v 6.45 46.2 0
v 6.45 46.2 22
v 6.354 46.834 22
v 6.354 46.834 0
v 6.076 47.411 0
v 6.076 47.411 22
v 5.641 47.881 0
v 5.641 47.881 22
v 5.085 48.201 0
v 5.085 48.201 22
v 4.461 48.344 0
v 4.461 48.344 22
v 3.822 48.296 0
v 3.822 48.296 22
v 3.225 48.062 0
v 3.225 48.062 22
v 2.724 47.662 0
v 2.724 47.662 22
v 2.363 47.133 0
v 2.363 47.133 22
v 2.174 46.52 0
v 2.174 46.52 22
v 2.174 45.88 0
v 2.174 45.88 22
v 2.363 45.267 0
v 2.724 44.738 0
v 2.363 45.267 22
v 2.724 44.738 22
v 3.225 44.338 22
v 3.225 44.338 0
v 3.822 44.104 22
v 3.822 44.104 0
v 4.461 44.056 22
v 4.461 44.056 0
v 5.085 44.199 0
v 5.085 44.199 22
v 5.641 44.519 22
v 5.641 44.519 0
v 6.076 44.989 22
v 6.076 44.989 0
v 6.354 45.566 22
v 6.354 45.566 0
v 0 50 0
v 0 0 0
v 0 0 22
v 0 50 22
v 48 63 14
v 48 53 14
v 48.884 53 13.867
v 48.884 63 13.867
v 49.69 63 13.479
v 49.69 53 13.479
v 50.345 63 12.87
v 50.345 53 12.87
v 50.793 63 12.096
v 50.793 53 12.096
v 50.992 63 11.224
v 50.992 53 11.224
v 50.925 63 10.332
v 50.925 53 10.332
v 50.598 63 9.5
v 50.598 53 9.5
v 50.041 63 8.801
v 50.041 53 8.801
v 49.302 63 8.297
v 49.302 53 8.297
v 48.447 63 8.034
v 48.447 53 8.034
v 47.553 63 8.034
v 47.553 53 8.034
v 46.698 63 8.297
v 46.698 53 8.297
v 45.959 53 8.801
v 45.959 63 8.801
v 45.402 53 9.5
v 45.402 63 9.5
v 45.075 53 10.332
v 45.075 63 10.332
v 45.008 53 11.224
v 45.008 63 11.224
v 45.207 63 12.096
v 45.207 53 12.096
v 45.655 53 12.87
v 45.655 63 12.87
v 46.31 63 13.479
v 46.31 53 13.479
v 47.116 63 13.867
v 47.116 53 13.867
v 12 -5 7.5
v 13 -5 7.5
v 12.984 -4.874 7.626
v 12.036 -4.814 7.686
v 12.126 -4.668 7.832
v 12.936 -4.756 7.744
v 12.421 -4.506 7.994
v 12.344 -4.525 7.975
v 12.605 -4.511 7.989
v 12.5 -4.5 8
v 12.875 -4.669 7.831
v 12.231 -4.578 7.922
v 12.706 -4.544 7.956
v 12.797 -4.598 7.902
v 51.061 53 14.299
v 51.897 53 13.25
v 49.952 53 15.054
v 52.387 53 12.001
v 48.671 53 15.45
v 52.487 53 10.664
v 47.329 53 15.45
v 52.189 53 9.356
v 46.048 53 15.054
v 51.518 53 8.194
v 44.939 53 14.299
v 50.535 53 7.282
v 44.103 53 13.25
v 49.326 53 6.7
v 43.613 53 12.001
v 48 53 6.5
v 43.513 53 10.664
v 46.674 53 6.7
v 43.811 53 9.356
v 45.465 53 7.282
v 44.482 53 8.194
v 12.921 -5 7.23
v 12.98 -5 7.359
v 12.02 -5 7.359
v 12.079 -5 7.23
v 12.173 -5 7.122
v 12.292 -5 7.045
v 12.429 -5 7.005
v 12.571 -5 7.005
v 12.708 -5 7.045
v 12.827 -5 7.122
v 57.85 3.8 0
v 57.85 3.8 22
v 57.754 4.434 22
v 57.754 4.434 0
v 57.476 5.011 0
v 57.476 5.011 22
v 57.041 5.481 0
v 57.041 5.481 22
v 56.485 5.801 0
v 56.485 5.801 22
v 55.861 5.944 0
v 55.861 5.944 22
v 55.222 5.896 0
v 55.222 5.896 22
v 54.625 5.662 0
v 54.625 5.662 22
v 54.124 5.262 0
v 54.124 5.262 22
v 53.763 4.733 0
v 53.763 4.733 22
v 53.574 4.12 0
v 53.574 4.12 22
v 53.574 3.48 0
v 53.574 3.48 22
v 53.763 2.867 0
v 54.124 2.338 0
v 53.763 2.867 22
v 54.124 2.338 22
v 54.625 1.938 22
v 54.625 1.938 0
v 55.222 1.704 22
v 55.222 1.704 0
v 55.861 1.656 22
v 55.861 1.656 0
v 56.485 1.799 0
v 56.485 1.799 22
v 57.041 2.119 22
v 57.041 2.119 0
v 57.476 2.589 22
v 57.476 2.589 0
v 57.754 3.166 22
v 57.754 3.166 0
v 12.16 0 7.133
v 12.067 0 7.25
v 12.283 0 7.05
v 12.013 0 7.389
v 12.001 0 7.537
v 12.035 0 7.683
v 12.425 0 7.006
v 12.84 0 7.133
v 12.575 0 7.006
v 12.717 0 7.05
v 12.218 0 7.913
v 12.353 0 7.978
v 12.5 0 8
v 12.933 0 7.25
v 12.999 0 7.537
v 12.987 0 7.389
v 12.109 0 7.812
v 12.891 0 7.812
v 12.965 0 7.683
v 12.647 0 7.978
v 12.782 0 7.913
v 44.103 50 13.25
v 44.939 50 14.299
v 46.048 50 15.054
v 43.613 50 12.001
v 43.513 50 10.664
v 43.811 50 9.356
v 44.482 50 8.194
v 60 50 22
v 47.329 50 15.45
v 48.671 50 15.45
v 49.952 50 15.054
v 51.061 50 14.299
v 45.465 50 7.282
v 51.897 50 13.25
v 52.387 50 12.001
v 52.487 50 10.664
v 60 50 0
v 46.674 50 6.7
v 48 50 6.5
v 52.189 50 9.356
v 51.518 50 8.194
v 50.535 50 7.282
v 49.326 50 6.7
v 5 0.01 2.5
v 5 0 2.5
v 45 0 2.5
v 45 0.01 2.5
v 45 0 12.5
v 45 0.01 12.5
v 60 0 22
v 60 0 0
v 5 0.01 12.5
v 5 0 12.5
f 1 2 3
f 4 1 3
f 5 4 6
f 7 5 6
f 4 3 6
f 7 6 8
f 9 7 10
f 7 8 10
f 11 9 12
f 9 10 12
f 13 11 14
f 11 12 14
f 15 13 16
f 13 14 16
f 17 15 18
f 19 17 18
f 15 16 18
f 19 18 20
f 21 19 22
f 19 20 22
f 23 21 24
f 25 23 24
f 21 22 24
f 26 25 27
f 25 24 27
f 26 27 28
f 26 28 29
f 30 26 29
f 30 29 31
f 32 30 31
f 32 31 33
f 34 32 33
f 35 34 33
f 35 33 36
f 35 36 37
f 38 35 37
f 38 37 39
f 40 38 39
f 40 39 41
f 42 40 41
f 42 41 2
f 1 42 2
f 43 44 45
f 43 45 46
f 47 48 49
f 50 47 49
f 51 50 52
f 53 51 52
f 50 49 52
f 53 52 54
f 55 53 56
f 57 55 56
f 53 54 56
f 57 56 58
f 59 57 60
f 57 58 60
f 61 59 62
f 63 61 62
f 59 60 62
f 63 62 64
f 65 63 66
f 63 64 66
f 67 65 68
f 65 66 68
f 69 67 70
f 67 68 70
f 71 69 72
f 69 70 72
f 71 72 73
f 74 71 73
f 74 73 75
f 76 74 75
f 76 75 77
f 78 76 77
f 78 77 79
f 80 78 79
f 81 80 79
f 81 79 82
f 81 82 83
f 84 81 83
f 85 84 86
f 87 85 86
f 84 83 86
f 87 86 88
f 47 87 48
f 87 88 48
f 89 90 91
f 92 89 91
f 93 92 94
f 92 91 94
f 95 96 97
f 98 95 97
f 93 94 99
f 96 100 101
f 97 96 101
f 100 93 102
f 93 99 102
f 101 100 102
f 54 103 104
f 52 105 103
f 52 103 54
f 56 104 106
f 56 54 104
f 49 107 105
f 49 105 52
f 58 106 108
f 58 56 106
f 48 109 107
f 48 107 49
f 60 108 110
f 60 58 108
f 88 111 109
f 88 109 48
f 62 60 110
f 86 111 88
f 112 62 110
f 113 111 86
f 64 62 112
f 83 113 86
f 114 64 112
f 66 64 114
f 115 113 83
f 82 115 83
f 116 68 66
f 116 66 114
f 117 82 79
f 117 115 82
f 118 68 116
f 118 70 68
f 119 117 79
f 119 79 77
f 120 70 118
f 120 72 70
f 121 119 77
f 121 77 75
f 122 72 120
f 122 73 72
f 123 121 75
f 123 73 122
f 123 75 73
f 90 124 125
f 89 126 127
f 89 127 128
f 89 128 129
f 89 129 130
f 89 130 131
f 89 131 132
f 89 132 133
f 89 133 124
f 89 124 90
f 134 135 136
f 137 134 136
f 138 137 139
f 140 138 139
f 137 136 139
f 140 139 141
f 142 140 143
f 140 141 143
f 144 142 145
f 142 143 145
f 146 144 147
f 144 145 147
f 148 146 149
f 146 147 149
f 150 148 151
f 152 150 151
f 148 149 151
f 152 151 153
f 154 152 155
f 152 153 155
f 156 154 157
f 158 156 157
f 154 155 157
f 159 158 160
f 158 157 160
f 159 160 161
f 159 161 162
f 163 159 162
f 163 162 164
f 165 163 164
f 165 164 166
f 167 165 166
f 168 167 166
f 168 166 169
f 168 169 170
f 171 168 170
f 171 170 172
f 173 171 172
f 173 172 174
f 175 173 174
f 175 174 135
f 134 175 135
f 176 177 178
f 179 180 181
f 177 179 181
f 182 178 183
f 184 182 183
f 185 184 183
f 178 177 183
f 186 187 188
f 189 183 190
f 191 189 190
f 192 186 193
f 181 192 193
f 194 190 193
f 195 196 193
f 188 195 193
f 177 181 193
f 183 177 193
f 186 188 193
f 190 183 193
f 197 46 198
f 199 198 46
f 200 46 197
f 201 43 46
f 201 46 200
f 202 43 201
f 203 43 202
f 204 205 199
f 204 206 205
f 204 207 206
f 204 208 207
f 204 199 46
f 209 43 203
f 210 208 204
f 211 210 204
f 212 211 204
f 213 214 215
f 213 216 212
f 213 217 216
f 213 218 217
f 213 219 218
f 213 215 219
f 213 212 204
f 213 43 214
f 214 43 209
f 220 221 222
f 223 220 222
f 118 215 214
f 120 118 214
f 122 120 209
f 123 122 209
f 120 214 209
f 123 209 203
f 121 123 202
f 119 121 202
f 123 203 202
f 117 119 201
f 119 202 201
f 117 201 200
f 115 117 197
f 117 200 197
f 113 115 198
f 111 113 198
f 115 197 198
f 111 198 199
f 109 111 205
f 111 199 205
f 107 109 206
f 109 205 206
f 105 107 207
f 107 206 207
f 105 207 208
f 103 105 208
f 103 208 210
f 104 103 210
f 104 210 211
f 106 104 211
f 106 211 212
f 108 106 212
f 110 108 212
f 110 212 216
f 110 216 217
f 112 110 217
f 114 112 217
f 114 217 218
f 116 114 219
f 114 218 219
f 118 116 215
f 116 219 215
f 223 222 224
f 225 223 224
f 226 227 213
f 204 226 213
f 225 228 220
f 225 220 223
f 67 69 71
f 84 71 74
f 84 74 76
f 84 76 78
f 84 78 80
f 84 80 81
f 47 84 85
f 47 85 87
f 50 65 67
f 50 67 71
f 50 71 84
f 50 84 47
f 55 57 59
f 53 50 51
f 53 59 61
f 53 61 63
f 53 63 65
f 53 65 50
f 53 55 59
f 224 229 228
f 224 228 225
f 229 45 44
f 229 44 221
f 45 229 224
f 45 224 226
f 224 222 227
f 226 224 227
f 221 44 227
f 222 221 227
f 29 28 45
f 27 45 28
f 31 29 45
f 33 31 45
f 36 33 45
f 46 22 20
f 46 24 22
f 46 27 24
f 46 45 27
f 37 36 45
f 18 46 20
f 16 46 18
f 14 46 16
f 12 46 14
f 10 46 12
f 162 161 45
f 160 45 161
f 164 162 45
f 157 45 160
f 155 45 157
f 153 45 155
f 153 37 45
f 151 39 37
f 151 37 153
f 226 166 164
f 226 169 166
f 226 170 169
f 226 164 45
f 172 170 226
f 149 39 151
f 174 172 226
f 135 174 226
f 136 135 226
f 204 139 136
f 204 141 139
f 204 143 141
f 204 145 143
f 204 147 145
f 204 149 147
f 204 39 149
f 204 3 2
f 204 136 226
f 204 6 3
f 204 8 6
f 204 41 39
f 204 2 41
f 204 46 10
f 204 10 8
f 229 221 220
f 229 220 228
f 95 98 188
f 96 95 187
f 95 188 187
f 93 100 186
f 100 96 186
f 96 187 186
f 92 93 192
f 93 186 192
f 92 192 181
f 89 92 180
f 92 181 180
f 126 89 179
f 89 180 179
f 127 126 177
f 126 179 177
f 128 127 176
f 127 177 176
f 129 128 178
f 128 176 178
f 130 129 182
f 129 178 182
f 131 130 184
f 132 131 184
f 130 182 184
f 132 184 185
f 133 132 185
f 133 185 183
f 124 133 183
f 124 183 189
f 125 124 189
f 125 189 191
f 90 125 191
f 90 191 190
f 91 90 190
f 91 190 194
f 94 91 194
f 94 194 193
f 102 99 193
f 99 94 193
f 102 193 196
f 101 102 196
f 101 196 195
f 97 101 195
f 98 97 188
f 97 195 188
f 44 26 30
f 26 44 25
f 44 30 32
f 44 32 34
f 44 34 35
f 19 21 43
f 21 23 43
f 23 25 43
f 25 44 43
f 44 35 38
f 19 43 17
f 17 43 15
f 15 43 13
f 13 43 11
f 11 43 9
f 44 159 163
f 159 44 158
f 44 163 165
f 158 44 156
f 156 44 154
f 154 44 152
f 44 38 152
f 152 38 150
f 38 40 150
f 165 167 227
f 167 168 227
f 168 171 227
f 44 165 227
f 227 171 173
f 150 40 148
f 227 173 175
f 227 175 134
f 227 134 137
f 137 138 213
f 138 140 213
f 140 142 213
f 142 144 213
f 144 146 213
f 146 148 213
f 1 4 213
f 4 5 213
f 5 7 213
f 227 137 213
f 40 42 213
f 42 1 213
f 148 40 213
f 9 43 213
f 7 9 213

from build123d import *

# Parameters (mm, degrees)
SKETCH_1_W          = 60
SKETCH_1_H          = 50
EXTRUDE_1_DEPTH     = 22
SKETCH_2_R          = 4.5
EXTRUDE_2_DEPTH     = 3
SKETCH_3_R          = 3
EXTRUDE_3_DEPTH     = 10
SKETCH_4_R          = 0.5
EXTRUDE_4_DEPTH     = 5
SKETCH_5_W          = 40
SKETCH_5_H          = 10
CUT_EXTRUDE_1_DEPTH = 0.01
SKETCH_6_R          = 2.15
CUT_EXTRUDE_2_DEPTH = 90.738509014
CUT_EXTRUDE_3_DEPTH = 90.738509014


with BuildPart() as part:
    # 草图1 → 凸台-拉伸1 (new body)
    with BuildSketch(Plane.XY):
        with Locations((30, 25)):
            Rectangle(SKETCH_1_W, SKETCH_1_H)
    extrude(amount=EXTRUDE_1_DEPTH)

    # 草图2 → 凸台-拉伸2 (add)
    with BuildSketch(Plane(origin=(0, 50, 0), x_dir=(1, 0, 0), z_dir=(0, 1, 0))):
        with Locations(Location((48, -11, 0), (0, 0, 90))):
            Circle(SKETCH_2_R)
    extrude(amount=EXTRUDE_2_DEPTH)

    # 草图3 → 凸台-拉伸3 (add)
    with BuildSketch(Plane(origin=(0, 53, 0), x_dir=(1, 0, 0), z_dir=(0, 1, 0))):
        with Locations(Location((48, -11, 0), (0, 0, 270))):
            Circle(SKETCH_3_R)
    extrude(amount=EXTRUDE_3_DEPTH)

    # 草图4 → 凸台-拉伸4 (add)
    with BuildSketch(Plane.XZ):
        with Locations(Location((12.5, 7.5, 0), (0, 0, 90))):
            Circle(SKETCH_4_R)
    extrude(amount=EXTRUDE_4_DEPTH)

    # 草图5 → 切除-拉伸1 (cut)
    with BuildSketch(Plane.XZ):
        with Locations((25, 7.5)):
            Rectangle(SKETCH_5_W, SKETCH_5_H)
    extrude(amount=-CUT_EXTRUDE_1_DEPTH, mode=Mode.SUBTRACT)


with BuildPart() as cut_extrude_1_piece_1:
    # of the separate pieces the step leaves, piece 1, a body of its own (cut_extrude_1_pieces)
    add(part.part.solids().sort_by_distance((0, 0, 0))[0])

    # 草图6 → 切除-拉伸2 (cut, through all)
    with BuildSketch(Plane.XY.offset(22)):
        with Locations((55.7, 3.8)):
            Circle(SKETCH_6_R)
        with Locations((4.3, 46.2)):
            Circle(SKETCH_6_R)
    extrude(amount=-CUT_EXTRUDE_2_DEPTH, mode=Mode.SUBTRACT)


with BuildPart() as cut_extrude_1_piece_2:
    # of the separate pieces the step leaves, piece 2, a body of its own (cut_extrude_1_pieces)
    add(part.part.solids().sort_by_distance((12.5, 0, 8))[0])

    # 草图7 → 切除-拉伸3 (cut, through all)
    with BuildSketch(Plane(origin=(60, 0, 0), x_dir=(0, 0, -1), z_dir=(1, 0, 0))):
        Polygon((-7.5, -5), (-8, -4.5), (-8, -5), align=None)
    extrude(amount=-CUT_EXTRUDE_3_DEPTH, mode=Mode.SUBTRACT)


solid = Compound([cut_extrude_1_piece_1.part, cut_extrude_1_piece_2.part])
